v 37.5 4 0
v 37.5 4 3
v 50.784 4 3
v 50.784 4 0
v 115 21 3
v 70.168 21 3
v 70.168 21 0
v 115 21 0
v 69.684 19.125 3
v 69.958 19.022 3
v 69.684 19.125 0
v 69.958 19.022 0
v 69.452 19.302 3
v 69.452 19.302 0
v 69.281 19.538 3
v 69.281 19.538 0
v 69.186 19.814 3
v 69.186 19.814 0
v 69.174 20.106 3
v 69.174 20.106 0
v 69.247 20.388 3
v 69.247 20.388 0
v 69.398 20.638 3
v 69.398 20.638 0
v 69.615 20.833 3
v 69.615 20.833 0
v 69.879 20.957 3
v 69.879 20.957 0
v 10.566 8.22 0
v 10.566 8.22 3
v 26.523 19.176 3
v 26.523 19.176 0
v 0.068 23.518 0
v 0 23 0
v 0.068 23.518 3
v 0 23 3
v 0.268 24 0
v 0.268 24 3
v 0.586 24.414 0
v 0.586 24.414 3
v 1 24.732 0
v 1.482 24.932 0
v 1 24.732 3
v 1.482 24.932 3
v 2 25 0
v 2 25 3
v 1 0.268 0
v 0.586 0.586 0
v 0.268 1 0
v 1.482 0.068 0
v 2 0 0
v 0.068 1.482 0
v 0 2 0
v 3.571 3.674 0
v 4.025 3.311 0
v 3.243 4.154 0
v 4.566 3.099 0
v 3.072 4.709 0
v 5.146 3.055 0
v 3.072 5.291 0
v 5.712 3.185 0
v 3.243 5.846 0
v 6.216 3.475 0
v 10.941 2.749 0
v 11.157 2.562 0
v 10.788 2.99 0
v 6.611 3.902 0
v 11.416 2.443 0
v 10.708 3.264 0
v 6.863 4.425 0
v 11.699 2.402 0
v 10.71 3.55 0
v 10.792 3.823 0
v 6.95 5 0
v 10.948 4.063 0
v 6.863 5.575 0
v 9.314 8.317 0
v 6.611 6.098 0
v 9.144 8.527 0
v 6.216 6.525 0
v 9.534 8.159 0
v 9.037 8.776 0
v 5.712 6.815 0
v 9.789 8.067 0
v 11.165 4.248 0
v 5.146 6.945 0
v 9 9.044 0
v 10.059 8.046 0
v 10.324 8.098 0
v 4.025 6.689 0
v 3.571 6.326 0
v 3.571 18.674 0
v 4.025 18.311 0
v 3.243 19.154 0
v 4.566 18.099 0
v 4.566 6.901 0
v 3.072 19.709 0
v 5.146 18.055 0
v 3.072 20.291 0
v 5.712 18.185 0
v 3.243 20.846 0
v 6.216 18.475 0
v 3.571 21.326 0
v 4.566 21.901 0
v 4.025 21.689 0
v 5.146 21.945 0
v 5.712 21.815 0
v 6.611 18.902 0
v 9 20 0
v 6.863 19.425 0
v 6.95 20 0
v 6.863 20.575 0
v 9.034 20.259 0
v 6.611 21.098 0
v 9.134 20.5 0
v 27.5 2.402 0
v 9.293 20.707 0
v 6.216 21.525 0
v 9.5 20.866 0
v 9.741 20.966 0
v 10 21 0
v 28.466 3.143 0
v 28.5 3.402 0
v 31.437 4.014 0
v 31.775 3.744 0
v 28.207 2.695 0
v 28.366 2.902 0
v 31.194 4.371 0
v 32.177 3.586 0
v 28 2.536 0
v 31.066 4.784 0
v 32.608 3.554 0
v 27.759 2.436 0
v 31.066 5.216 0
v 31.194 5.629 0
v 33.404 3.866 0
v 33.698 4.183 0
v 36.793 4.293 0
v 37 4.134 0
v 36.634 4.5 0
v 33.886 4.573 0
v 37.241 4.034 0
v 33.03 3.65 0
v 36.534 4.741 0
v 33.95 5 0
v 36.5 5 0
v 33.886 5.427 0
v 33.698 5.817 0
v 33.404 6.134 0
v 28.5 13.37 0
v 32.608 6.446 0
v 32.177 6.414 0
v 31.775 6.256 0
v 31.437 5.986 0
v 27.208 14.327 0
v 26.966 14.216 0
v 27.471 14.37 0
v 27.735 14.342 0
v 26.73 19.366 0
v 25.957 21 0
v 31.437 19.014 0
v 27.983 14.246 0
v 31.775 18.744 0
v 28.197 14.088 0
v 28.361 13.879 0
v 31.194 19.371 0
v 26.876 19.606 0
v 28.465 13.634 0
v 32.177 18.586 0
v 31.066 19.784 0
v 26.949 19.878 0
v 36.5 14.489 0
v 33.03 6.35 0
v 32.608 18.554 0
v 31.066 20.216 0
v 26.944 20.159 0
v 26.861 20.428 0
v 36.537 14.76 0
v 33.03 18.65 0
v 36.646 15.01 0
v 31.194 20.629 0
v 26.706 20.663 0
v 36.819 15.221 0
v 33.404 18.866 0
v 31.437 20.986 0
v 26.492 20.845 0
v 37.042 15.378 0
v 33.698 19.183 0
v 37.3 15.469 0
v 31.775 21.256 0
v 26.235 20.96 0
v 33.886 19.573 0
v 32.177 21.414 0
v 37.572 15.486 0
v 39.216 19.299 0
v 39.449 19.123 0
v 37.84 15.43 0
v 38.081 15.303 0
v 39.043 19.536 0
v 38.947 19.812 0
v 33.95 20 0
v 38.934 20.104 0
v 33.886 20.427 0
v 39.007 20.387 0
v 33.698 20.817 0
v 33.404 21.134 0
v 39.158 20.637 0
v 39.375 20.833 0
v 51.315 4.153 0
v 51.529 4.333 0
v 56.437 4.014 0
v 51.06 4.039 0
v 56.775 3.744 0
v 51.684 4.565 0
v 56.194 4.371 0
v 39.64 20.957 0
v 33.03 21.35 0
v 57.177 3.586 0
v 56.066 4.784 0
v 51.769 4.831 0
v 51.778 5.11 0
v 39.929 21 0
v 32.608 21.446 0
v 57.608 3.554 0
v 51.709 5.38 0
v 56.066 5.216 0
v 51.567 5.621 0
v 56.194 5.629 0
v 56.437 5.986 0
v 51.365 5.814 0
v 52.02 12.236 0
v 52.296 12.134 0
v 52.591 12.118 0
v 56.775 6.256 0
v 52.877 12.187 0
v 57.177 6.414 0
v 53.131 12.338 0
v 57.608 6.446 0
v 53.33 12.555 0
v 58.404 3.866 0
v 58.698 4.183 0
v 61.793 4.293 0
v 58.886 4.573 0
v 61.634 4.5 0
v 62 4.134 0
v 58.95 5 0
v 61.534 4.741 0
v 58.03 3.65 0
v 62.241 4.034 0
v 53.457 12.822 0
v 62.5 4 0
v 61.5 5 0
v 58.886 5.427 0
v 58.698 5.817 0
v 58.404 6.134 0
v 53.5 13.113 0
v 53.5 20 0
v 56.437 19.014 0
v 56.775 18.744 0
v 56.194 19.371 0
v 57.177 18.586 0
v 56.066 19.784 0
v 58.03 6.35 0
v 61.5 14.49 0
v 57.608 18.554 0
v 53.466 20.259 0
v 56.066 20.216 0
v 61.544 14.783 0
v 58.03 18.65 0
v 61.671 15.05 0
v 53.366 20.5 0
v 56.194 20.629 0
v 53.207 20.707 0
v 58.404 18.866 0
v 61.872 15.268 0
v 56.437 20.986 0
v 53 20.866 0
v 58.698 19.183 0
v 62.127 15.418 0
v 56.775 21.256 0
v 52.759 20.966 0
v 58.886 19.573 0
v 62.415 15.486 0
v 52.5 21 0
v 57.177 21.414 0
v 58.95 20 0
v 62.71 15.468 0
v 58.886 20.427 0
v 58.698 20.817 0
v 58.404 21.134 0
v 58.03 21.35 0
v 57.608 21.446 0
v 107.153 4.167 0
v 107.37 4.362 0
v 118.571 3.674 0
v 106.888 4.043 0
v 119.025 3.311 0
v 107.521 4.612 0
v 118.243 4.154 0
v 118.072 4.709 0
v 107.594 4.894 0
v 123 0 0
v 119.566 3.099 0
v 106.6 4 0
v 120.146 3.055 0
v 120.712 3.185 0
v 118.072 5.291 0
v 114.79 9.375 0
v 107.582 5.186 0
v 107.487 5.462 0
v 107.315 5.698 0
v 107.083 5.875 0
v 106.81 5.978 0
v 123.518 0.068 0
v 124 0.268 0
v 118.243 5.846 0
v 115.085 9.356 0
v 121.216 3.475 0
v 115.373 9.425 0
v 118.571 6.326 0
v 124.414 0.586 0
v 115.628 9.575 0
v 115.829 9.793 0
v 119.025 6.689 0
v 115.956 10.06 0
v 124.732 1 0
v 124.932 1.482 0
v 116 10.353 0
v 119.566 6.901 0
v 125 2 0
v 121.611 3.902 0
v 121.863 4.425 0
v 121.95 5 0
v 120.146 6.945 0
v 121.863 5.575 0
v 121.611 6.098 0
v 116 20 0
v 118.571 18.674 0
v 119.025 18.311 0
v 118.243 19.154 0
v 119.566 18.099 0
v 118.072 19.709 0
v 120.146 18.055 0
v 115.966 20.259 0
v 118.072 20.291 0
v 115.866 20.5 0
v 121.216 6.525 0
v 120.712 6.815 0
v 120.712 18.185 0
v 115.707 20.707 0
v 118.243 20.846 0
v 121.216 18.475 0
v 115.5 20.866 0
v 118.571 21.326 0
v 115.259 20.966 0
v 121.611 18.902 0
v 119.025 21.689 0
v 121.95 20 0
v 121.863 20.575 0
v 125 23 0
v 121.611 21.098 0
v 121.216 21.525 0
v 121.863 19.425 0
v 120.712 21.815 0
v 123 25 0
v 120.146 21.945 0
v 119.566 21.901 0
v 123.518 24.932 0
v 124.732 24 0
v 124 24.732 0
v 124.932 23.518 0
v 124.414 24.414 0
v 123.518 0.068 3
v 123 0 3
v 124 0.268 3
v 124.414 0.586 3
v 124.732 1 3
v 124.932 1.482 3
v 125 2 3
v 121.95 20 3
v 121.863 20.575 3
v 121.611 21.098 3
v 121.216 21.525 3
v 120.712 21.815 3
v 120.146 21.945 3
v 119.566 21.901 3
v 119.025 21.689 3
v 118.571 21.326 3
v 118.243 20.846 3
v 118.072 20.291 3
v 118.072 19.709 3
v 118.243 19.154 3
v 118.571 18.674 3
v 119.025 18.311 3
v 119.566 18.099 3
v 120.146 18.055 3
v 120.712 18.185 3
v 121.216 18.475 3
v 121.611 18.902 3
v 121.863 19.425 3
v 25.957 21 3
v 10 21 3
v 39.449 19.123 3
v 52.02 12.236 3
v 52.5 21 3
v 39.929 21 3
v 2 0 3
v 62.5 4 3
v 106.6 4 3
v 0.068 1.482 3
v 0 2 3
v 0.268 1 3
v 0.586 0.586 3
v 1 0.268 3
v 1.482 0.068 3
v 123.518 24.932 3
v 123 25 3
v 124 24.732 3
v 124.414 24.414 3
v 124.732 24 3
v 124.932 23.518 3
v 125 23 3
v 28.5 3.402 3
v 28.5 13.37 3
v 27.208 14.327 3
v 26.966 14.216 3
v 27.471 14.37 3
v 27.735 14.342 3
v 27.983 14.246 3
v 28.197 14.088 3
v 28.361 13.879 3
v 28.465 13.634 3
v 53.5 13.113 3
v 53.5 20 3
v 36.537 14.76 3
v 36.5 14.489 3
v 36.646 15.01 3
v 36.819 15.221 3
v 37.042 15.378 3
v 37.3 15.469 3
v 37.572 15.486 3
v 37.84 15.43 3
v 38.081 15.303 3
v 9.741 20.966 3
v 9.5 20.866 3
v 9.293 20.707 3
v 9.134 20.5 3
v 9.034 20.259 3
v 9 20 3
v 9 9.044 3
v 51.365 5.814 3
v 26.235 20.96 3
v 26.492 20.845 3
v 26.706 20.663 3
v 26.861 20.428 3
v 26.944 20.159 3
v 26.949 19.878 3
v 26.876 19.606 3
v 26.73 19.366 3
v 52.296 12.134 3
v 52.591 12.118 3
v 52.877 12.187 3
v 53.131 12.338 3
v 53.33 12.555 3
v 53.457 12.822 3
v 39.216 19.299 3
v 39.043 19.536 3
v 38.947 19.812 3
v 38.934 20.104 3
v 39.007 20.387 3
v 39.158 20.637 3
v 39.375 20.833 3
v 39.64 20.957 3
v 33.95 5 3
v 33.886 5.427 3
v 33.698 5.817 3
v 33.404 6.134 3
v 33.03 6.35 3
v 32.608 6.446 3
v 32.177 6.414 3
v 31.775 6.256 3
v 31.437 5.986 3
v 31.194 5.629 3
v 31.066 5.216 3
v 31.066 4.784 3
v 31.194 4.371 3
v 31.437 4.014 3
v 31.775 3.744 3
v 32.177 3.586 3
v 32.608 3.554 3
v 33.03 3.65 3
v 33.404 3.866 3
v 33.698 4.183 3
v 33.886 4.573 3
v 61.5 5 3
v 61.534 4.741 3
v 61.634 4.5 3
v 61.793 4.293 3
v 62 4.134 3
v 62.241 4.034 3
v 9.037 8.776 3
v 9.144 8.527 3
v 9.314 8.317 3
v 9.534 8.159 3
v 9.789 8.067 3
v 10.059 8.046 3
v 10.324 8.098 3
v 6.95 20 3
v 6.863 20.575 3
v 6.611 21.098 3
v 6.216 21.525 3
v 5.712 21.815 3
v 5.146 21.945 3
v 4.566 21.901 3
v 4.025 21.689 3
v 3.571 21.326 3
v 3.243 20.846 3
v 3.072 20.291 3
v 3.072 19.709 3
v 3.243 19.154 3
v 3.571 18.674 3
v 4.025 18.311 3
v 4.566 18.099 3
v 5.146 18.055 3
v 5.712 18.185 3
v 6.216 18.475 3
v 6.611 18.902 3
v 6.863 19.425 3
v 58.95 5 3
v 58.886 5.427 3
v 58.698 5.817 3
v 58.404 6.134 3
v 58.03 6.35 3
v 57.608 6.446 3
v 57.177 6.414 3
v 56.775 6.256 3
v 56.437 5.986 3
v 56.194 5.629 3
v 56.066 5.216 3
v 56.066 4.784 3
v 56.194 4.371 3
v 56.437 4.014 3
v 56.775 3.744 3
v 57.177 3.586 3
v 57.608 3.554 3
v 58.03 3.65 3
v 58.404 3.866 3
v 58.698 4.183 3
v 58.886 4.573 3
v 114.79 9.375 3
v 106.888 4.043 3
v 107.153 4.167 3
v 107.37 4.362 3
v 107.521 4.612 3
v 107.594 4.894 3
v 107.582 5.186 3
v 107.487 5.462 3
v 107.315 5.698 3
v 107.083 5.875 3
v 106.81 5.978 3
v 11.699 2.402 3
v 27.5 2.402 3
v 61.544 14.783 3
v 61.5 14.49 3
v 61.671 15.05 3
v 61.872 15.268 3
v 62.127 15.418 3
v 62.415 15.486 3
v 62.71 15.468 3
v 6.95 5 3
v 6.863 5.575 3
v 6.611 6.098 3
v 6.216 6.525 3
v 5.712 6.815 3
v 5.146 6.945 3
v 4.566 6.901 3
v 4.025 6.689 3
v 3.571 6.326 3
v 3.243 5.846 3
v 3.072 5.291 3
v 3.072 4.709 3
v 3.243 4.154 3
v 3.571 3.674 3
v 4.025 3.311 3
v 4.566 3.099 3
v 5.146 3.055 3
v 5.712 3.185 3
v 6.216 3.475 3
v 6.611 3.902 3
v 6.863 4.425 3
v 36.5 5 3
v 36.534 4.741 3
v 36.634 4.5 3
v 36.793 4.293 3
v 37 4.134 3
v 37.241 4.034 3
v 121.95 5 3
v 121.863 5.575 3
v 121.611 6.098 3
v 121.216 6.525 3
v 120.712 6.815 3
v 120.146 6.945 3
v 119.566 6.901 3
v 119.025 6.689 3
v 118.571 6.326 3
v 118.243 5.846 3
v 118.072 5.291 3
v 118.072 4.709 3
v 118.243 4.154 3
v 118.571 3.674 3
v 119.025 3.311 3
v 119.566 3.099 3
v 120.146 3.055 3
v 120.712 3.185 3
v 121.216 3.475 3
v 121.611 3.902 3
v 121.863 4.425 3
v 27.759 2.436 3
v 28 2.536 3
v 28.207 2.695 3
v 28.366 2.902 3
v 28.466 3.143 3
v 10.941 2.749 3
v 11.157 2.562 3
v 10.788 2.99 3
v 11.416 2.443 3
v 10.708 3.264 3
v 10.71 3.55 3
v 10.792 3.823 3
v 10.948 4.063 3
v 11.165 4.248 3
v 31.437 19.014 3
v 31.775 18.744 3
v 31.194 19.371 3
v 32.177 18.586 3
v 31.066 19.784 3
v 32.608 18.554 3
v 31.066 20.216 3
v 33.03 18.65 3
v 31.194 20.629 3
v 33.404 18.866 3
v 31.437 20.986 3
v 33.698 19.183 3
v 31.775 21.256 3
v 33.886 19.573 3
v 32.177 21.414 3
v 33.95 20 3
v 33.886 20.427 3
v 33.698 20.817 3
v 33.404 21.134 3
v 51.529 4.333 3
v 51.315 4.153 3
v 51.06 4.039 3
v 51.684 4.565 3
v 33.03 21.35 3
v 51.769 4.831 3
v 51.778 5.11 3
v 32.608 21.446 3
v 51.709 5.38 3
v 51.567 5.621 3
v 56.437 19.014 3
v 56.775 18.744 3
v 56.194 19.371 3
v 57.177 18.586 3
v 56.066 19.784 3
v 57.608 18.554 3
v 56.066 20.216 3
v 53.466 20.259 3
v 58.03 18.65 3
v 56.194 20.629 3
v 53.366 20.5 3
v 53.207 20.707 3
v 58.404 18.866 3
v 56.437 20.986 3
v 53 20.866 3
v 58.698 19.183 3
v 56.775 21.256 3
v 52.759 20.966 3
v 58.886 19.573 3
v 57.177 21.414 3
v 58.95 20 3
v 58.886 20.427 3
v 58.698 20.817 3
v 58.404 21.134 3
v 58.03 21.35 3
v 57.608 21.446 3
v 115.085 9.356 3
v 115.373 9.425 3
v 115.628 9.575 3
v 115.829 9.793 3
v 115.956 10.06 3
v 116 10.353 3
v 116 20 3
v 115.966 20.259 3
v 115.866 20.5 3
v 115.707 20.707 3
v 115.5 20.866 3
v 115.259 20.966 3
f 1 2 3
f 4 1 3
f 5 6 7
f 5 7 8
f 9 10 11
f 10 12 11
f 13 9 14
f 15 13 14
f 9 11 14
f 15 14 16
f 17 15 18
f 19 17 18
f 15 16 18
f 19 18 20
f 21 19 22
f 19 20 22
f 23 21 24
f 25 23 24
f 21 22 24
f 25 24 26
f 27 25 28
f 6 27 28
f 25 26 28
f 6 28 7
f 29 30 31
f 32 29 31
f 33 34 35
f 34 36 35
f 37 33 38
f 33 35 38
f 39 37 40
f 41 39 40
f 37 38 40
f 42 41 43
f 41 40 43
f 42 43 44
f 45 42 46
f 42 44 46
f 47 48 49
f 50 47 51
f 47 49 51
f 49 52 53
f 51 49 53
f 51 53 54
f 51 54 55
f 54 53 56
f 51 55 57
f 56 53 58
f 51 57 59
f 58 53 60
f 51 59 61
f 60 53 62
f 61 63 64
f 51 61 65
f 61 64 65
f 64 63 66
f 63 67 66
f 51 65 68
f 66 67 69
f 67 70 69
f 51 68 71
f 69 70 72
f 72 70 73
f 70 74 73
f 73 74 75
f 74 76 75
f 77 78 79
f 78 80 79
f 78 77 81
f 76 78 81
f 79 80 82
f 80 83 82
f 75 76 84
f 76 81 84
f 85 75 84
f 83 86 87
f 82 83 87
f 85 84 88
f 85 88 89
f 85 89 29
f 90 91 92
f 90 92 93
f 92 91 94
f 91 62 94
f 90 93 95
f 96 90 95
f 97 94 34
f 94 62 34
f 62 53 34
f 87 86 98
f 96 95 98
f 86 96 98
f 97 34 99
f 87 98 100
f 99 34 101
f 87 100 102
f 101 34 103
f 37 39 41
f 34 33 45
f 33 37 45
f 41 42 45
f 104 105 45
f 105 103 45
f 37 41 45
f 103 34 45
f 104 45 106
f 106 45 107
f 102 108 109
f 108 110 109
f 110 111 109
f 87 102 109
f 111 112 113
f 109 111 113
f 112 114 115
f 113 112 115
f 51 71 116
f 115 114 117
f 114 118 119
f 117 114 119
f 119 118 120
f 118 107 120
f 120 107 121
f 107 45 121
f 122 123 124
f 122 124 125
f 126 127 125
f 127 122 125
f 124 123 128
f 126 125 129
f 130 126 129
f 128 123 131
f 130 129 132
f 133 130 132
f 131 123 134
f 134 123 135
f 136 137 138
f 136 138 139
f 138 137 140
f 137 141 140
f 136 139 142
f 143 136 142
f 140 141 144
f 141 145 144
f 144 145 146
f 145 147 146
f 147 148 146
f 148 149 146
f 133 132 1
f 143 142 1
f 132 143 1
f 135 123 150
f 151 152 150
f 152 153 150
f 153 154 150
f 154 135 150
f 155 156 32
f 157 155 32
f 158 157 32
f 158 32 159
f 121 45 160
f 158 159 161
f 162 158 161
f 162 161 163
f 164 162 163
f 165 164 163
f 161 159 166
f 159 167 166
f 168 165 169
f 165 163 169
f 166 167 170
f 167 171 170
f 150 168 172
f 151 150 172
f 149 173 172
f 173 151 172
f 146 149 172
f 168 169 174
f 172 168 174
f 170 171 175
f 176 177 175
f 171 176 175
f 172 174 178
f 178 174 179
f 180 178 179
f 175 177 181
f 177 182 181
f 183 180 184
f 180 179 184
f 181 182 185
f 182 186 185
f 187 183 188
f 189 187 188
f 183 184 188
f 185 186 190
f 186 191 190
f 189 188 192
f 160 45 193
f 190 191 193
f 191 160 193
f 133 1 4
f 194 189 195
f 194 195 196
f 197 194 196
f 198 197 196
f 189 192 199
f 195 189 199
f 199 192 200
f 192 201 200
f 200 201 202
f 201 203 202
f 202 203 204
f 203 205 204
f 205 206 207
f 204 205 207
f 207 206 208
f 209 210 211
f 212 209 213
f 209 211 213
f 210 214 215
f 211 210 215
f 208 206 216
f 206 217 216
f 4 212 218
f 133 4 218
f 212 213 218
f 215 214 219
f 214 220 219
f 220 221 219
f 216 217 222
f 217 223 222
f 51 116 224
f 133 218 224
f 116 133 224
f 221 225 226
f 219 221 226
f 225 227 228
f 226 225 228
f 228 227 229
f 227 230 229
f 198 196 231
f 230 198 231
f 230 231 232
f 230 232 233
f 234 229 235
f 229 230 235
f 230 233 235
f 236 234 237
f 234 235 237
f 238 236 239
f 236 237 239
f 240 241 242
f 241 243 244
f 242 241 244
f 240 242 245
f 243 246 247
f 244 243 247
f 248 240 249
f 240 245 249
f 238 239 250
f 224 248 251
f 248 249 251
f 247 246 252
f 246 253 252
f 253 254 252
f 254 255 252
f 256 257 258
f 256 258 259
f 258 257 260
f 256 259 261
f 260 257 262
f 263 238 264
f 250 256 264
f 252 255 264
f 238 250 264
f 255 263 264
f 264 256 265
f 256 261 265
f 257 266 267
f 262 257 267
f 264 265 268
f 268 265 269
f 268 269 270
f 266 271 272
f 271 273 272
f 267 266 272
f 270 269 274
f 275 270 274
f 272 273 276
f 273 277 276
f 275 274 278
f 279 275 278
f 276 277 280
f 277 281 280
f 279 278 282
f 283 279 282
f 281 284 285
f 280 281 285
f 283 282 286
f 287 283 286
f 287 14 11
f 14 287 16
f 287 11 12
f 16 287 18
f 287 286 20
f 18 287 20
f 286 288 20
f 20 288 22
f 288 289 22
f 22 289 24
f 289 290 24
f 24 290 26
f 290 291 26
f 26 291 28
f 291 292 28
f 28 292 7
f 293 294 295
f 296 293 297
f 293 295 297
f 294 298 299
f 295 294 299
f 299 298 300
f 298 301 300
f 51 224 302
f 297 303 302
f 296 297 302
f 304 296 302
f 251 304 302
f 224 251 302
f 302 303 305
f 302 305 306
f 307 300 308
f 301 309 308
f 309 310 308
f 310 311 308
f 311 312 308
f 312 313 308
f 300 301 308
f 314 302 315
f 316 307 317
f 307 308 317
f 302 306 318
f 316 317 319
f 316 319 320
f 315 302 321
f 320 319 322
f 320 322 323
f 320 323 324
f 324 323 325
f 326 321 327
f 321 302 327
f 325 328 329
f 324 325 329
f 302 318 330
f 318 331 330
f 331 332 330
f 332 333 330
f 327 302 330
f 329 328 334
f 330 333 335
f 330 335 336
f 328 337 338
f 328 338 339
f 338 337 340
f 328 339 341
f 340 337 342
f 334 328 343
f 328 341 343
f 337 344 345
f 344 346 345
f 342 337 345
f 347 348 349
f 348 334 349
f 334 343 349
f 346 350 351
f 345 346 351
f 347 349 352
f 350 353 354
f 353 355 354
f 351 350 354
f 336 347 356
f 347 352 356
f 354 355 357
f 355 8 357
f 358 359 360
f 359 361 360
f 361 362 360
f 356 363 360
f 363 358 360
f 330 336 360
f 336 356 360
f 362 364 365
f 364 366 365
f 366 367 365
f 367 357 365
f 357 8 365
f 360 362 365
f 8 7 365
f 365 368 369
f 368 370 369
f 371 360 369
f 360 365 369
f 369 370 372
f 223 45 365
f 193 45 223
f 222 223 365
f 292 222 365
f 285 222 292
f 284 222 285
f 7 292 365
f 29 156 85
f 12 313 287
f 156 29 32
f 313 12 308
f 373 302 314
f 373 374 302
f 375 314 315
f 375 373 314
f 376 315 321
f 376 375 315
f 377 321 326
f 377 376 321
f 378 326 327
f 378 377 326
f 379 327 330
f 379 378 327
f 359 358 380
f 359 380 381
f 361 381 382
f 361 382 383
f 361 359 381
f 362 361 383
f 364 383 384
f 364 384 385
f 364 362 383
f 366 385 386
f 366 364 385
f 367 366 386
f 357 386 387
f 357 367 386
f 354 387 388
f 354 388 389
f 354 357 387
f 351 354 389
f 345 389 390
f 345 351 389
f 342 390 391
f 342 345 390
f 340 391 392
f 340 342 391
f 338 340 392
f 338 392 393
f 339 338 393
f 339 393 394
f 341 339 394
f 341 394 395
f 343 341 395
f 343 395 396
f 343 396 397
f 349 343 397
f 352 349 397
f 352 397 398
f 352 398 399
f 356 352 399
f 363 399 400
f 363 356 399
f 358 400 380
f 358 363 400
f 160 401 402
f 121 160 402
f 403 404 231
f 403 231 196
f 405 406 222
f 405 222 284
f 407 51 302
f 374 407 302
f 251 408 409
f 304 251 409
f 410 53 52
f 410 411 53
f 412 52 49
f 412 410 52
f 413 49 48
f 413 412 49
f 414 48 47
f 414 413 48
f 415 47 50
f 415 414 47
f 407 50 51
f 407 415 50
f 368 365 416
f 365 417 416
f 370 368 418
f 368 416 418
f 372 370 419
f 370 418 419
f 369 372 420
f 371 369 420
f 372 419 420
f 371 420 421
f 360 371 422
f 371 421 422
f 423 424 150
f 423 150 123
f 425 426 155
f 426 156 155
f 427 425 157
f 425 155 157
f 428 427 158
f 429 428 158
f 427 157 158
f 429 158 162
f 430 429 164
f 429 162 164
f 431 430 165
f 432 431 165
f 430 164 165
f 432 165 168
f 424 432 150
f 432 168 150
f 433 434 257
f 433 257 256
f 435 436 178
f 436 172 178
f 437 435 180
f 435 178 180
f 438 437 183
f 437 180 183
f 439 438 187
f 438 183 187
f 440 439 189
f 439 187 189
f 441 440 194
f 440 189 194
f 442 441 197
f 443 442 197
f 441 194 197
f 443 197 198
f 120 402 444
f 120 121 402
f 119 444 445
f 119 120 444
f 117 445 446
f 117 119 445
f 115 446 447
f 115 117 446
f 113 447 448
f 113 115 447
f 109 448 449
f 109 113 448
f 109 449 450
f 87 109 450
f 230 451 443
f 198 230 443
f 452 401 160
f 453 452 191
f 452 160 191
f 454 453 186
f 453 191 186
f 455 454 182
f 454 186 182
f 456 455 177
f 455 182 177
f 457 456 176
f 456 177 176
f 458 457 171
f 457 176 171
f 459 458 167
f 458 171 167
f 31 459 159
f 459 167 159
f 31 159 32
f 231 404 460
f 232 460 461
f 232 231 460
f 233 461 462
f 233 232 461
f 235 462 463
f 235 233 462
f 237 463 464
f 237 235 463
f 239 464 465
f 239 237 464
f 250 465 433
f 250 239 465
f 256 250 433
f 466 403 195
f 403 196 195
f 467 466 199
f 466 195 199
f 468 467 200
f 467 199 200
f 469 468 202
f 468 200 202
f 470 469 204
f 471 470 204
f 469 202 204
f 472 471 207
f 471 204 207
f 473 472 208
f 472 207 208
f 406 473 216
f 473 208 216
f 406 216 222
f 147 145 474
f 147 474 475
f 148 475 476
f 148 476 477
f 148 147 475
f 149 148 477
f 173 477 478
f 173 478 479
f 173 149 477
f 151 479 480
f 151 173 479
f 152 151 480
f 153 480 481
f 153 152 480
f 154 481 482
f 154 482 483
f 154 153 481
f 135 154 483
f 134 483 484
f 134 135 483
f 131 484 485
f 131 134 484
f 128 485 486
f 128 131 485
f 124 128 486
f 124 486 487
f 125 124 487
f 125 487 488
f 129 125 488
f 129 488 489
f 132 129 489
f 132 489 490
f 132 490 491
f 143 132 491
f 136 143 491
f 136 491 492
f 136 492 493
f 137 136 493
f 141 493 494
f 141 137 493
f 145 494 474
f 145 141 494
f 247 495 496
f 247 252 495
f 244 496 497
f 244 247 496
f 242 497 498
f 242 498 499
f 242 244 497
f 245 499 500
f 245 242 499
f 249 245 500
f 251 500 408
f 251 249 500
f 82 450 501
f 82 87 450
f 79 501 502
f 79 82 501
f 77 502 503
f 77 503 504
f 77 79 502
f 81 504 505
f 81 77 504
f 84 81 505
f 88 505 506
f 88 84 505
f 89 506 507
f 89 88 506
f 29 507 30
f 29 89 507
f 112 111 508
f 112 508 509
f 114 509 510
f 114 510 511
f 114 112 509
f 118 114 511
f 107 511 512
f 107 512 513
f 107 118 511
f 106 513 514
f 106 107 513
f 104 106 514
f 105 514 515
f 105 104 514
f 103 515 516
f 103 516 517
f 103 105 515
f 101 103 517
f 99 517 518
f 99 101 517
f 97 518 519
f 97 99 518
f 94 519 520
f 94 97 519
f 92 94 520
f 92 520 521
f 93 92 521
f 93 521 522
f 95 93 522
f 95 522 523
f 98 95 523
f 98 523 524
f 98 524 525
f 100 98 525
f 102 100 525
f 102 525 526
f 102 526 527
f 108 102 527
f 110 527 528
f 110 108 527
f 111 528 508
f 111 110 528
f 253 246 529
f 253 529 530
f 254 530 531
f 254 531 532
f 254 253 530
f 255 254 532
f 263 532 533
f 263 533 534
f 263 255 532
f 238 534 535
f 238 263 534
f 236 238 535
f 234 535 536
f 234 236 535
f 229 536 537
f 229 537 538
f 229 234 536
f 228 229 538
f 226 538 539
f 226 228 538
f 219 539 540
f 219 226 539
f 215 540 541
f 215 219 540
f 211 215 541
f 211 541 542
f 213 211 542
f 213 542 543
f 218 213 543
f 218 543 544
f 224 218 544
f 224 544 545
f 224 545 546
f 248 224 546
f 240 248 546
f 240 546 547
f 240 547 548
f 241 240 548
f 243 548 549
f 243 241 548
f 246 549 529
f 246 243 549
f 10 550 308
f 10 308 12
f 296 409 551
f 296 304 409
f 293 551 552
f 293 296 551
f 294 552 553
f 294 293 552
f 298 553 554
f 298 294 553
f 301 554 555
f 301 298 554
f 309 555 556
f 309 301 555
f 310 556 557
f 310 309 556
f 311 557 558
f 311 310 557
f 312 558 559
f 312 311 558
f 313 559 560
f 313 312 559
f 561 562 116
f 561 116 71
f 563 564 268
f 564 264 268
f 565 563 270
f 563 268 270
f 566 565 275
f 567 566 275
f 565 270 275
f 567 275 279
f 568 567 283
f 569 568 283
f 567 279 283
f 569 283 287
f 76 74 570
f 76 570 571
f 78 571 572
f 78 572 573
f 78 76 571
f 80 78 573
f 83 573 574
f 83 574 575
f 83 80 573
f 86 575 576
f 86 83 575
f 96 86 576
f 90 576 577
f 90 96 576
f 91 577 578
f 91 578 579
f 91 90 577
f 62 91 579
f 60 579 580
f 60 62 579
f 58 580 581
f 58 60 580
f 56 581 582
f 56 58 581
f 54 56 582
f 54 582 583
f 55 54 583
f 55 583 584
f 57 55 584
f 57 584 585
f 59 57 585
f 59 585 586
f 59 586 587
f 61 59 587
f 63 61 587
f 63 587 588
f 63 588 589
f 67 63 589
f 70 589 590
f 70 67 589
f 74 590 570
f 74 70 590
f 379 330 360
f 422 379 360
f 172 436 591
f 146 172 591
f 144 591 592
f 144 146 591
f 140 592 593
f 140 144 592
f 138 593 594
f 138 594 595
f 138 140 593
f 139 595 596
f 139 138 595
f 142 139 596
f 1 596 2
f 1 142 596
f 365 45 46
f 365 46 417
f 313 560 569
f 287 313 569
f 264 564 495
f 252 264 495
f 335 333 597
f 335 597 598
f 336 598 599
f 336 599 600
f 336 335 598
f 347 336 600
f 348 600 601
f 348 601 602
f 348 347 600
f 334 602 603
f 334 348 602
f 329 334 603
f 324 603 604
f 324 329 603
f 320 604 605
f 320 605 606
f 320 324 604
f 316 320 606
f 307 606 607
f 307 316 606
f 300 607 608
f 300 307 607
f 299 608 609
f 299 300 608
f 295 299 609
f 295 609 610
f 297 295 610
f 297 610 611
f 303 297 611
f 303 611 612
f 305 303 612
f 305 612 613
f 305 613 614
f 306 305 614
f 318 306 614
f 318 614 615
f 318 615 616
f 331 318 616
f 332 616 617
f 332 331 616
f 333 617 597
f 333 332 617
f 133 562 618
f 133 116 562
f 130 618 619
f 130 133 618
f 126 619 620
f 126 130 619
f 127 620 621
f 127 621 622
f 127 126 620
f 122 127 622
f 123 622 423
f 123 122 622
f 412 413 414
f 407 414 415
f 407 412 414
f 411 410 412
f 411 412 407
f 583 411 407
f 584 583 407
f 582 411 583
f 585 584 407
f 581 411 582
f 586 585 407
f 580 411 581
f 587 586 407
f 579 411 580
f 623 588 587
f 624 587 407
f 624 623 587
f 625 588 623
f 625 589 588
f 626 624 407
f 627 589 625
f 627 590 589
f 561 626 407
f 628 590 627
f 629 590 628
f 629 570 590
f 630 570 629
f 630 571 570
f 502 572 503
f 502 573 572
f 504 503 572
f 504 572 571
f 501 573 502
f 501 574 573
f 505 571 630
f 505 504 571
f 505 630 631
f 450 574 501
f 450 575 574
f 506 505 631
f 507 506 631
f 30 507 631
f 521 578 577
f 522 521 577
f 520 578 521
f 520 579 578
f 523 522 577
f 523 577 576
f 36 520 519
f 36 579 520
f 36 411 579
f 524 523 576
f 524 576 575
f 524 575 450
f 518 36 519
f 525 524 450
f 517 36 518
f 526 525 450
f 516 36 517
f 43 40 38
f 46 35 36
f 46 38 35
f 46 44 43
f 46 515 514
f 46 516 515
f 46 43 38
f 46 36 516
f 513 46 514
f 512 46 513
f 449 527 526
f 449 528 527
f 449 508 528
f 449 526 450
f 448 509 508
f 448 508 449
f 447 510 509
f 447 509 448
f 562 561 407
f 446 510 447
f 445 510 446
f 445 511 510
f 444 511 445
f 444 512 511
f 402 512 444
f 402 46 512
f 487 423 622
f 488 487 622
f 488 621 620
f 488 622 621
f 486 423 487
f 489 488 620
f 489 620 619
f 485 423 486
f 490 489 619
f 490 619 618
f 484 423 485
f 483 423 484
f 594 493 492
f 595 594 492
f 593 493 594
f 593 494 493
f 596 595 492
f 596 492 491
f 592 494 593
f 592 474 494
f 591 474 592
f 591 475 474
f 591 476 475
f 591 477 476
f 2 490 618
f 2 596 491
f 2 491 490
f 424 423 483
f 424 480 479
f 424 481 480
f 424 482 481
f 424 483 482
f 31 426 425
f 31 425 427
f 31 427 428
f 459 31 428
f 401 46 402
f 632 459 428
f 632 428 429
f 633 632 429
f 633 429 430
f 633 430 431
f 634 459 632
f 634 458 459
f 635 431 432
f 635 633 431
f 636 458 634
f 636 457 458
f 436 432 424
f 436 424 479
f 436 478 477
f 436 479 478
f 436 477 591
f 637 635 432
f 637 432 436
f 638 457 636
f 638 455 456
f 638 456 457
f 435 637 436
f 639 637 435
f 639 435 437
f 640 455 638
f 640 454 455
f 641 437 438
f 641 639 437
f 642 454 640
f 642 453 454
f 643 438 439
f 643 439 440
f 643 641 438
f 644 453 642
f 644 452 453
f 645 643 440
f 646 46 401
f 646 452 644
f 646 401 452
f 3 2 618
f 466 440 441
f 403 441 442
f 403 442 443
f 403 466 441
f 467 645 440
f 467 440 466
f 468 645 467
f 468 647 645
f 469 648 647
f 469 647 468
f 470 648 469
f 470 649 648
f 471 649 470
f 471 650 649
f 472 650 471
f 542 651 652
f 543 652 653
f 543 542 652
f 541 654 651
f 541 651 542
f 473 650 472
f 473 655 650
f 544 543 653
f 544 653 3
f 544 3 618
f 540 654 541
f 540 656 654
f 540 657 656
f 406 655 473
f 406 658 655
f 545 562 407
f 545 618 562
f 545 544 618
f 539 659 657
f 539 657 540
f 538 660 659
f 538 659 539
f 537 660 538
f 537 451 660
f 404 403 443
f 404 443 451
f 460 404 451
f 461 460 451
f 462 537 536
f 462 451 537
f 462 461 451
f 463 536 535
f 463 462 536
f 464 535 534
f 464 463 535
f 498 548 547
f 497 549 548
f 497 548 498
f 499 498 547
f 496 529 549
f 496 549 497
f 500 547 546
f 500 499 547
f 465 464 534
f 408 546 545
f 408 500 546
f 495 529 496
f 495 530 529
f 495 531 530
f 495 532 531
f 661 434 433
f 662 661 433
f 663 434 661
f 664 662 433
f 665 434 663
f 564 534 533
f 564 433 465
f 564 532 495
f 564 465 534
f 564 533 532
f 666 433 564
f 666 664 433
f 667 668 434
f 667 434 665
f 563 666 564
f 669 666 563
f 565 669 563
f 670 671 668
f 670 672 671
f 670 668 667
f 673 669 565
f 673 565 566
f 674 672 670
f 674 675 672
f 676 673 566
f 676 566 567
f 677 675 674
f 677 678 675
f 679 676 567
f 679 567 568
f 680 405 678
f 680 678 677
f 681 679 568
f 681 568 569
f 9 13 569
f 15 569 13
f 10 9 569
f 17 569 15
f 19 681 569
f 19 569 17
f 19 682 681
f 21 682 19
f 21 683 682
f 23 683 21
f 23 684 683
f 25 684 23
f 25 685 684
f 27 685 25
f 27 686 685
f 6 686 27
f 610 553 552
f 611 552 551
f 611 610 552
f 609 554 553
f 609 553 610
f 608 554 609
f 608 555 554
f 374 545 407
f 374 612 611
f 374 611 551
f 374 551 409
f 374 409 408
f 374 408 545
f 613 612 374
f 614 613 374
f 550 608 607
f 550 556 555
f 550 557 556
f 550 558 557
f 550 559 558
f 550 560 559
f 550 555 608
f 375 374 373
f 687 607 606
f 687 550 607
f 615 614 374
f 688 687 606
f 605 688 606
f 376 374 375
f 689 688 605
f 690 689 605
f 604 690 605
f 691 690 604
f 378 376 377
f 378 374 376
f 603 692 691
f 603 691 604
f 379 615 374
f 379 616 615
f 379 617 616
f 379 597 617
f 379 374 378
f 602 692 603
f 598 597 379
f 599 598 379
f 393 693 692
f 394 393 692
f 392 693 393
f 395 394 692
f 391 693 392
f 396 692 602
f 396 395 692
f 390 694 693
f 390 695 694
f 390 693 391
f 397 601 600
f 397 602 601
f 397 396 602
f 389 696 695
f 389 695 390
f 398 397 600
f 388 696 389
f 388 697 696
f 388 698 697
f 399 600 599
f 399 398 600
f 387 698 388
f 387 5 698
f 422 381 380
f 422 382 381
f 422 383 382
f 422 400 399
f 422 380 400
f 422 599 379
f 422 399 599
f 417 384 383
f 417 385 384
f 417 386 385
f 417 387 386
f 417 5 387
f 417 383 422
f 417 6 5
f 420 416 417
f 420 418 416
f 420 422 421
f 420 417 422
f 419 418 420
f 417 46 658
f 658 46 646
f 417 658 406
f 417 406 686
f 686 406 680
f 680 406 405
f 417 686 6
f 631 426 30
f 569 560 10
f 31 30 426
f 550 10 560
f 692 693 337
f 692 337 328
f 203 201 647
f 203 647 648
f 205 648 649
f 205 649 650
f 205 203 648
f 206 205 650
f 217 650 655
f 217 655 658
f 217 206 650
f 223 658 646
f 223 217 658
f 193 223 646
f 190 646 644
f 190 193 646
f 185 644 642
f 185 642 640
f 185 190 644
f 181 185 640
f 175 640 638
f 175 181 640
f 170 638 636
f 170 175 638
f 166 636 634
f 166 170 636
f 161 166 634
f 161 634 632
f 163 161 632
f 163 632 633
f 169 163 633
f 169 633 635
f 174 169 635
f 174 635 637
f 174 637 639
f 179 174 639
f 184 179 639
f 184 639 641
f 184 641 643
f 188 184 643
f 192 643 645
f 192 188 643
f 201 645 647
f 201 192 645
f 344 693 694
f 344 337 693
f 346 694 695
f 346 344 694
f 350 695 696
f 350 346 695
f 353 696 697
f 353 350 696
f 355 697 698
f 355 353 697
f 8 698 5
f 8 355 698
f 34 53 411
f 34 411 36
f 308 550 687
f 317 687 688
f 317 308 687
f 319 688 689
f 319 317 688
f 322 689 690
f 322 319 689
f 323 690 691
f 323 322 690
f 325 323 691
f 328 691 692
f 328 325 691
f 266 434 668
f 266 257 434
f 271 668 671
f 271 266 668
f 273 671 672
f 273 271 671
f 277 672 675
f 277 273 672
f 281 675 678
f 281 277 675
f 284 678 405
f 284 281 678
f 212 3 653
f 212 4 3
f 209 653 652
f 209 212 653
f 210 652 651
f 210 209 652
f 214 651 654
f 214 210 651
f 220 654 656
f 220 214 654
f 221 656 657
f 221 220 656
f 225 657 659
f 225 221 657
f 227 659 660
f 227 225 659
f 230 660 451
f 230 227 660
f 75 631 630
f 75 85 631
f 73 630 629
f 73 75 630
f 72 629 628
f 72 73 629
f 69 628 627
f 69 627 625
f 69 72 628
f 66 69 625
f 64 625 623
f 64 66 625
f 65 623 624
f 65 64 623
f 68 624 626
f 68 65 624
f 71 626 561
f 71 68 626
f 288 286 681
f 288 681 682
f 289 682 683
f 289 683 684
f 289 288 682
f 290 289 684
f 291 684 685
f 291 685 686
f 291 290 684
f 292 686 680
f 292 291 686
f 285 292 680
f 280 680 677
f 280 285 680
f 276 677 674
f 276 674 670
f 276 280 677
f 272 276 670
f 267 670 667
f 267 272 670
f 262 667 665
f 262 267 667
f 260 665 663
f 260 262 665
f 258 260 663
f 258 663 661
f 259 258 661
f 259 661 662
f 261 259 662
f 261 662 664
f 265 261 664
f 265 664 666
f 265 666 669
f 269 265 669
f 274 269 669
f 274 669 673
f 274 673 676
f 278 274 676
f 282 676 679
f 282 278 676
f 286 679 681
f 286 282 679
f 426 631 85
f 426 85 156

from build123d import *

# Parameters (mm, degrees)
SKETCH_1_W          = 125
SKETCH_1_H          = 25
SKETCH_1_R          = 1.45
SKETCH_1_R_2        = 1.95
EXTRUDE_1_DEPTH     = 3
CUT_EXTRUDE_1_DEPTH = 10
FILLET_1_R          = 2
FILLET_2_R          = 1


with BuildPart() as part:
    # 草图1 → 凸台-拉伸1 (new body)
    with BuildSketch(Plane.XY):
        with Locations((62.5, 12.5)):
            Rectangle(SKETCH_1_W, SKETCH_1_H)
        with Locations((32.5, 20)):
            Circle(SKETCH_1_R, mode=Mode.SUBTRACT)
        with Locations((57.5, 20)):
            Circle(SKETCH_1_R, mode=Mode.SUBTRACT)
        with Locations((57.5, 5)):
            Circle(SKETCH_1_R, mode=Mode.SUBTRACT)
        with Locations((32.5, 5)):
            Circle(SKETCH_1_R, mode=Mode.SUBTRACT)
        with Locations((5, 20)):
            Circle(SKETCH_1_R_2, mode=Mode.SUBTRACT)
        with Locations((5, 5)):
            Circle(SKETCH_1_R_2, mode=Mode.SUBTRACT)
        with Locations((120, 20)):
            Circle(SKETCH_1_R_2, mode=Mode.SUBTRACT)
        with Locations((120, 5)):
            Circle(SKETCH_1_R_2, mode=Mode.SUBTRACT)
    extrude(amount=EXTRUDE_1_DEPTH)

    # 草图2 → 切除-拉伸1 (cut)
    with BuildSketch(Plane.XY.offset(3)):
        Polygon((60.767753727, 21), (116, 21), (116, 9.114458974), align=None)
        Polygon((61.5, 15.727967439), (61.5, 4), (116, 4), align=None)
        Polygon((36.02221675, 21), (53.5, 21), (53.5, 11.425425105), align=None)
        Polygon((36.5, 16.432325355), (36.5, 4), (53.904028142, 4), align=None)
        Polygon((29.180055305, 21), (9, 21), (9, 7.144539038), align=None)
        Polygon((28.5, 15.183615903), (28.5, 2.402022244), (8.239478793, 2.402022244), align=None)
    extrude(amount=-CUT_EXTRUDE_1_DEPTH, mode=Mode.SUBTRACT)

    # 圆角1
    fillet_1_edges = [part.edges().sort_by_distance(p)[0] for p in [
        (0, 25, 1.5),
        (125, 25, 1.5),
        (125, 0, 1.5),
        (0, 0, 1.5),
    ]]
    fillet(fillet_1_edges, radius=FILLET_1_R)

    # 圆角2
    fillet_2_edges = [part.edges().sort_by_distance(p)[0] for p in [
        (116, 9.114458974, 1.5),
        (60.767753727, 21, 1.5),
        (116, 21, 1.5),
        (29.180055305, 21, 1.5),
        (9, 7.144539038, 1.5),
        (9, 21, 1.5),
        (36.5, 16.432325355, 1.5),
        (53.904028142, 4, 1.5),
        (36.5, 4, 1.5),
        (53.5, 11.425425105, 1.5),
        (36.02221675, 21, 1.5),
        (53.5, 21, 1.5),
        (61.5, 15.727967439, 1.5),
        (116, 4, 1.5),
        (61.5, 4, 1.5),
        (8.239478793, 2.402022244, 1.5),
        (28.5, 15.183615903, 1.5),
        (28.5, 2.402022244, 1.5),
    ]]
    fillet(fillet_2_edges, radius=FILLET_2_R)


solid = part.part
